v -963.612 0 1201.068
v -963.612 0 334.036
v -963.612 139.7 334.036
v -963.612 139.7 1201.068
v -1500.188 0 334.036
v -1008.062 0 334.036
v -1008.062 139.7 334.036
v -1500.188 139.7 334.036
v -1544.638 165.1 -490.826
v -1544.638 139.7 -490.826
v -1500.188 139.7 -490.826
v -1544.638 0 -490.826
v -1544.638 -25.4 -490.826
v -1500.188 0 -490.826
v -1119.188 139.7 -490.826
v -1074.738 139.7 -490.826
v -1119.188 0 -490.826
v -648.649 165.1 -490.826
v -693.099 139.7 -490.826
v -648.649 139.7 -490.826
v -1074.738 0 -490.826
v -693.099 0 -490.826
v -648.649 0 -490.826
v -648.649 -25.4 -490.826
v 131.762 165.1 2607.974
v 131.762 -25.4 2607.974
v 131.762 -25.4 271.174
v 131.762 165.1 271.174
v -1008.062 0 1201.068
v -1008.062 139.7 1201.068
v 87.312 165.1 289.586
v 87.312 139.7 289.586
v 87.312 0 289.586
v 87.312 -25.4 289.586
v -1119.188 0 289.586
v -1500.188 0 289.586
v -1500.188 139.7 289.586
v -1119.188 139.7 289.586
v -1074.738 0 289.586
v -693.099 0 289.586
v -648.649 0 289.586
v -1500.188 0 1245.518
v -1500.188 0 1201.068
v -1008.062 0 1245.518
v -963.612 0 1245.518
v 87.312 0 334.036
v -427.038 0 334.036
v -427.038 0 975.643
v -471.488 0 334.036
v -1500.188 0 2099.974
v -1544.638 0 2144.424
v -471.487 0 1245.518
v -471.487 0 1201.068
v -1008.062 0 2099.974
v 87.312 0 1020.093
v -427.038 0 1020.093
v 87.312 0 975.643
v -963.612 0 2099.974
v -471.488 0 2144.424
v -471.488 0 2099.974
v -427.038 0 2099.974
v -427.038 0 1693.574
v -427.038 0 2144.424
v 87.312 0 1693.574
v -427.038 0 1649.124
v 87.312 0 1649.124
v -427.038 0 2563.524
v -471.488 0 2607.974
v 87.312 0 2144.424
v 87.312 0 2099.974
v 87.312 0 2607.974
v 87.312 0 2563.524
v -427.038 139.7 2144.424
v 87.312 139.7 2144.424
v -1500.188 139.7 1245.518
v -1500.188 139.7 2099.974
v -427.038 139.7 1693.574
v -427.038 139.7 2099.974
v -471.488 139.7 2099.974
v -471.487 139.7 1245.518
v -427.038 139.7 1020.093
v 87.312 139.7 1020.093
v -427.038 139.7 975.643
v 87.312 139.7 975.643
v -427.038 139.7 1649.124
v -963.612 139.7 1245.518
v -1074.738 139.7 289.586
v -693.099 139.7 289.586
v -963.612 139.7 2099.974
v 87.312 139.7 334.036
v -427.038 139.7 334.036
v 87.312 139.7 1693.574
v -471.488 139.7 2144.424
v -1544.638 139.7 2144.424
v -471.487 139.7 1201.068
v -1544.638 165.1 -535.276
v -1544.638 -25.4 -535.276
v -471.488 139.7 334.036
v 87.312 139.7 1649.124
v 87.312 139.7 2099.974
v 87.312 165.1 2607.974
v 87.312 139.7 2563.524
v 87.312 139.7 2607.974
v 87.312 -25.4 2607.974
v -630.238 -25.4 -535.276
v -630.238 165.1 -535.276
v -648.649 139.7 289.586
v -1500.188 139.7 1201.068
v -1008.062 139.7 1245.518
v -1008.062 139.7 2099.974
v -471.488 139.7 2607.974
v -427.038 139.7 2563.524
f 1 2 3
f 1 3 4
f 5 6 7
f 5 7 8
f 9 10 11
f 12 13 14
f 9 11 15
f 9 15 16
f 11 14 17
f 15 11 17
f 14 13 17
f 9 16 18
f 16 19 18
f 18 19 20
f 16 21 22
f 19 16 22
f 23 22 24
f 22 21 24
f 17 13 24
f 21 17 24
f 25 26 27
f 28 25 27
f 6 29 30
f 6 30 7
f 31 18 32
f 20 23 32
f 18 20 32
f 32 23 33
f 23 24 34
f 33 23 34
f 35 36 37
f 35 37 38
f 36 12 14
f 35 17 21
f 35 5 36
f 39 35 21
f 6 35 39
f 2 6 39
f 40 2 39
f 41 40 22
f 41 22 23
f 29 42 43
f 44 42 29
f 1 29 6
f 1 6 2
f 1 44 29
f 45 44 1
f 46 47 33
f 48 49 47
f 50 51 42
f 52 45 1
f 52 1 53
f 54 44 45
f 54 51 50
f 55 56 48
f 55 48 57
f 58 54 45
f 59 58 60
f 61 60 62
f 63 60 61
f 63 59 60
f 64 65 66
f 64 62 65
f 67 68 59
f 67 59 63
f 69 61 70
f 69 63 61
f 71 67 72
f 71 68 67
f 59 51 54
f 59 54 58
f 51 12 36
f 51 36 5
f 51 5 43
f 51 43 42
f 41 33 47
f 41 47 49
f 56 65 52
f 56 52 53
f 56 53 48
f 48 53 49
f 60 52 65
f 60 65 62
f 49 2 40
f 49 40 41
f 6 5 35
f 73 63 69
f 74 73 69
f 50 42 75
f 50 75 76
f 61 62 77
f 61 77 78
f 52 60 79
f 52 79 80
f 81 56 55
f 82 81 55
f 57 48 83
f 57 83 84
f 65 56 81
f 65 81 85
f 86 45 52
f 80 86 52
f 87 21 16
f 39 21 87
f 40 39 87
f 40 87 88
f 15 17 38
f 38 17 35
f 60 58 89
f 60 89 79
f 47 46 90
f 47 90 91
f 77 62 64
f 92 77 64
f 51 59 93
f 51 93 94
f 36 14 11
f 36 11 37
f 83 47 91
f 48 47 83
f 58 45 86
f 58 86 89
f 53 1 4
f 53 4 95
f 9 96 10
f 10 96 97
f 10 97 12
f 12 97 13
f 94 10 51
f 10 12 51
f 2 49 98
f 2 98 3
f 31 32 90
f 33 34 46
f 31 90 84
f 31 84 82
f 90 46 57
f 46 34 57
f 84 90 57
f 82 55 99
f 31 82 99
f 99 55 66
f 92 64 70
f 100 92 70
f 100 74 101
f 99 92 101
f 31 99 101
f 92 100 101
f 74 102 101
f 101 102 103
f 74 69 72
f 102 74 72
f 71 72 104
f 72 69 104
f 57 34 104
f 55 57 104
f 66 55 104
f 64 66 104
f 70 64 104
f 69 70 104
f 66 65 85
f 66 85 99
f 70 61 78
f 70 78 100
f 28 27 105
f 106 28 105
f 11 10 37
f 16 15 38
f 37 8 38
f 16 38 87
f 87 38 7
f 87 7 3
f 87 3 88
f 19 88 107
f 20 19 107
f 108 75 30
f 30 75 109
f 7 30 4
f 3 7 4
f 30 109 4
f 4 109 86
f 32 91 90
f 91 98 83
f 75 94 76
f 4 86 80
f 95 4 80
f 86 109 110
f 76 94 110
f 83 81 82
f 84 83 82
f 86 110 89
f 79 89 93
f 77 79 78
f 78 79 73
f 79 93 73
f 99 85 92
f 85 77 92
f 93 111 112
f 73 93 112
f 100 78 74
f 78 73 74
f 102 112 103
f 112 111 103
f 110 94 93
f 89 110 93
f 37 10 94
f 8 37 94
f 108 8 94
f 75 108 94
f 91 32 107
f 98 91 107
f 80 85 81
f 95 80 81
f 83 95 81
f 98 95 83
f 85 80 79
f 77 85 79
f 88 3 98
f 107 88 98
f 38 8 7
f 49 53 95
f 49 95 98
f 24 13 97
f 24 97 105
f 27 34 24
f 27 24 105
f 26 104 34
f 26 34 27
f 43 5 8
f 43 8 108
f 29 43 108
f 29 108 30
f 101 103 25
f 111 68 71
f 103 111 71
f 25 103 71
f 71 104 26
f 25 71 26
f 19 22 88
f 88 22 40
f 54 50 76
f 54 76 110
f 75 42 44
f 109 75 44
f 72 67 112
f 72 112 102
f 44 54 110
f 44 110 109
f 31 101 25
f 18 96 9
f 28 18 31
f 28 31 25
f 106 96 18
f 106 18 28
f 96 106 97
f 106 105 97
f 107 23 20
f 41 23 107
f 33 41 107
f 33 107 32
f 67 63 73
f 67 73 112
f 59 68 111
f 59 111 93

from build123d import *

# Parameters (mm, degrees)
F1_DEPTH = 25.4
F2_DEPTH = 165.1
F0_W     = 514.35
F0_H     = 44.45
F0_W_2   = 44.45
F0_H_2   = 780.411792
F0_W_3   = 492.125
F3_DEPTH = 139.7


with BuildPart() as f1:
    # F0 (on Front) → F1 (new body)
    with BuildSketch(Plane.XZ):
        Polygon((-648.649293, -490.826136), (-630.2375, -535.276136), (131.7625, 271.173864), (87.3125, 289.585656), align=None)
        Polygon((87.3125, 289.585656), (131.7625, 271.173864), (131.7625, 2607.973864), (87.3125, 2607.973864), (87.3125, 2563.523864), (87.3125, 2144.423864), (87.3125, 2099.973864), (87.3125, 1693.573864), (87.3125, 1649.123864), (87.3125, 1020.092864), (87.3125, 975.642864), (87.3125, 334.035656), align=None)
        Polygon((-1544.6375, -490.826136), (-1544.6375, -535.276136), (-630.2375, -535.276136), (-648.649293, -490.826136), (-693.099293, -490.826136), (-1074.7375, -490.826136), (-1119.1875, -490.826136), (-1500.1875, -490.826136), align=None)
    extrude(amount=F1_DEPTH)

    # F1_face (on face) → F2 (join)
    with BuildSketch(Plane(origin=(-236.089118, 0, 641.088849), x_dir=(1, 0, 0), z_dir=(0, 1, 0))):
        Polygon((367.851618, 369.914985), (-394.148382, 1176.364985), (-1308.548382, 1176.364985), (-1308.548382, 1131.914985), (-412.560175, 1131.914985), (323.401618, 351.503193), (323.401618, -1966.885015), (367.851618, -1966.885015), align=None)
    extrude(amount=F2_DEPTH)

    # F0 (on Front) → F3 (join)
    with BuildSketch(Plane.XZ):
        Polygon((-471.4875, 2607.973864), (-471.4875, 2144.423864), (-471.4875, 2099.973864), (-471.4875, 1245.517864), (-471.4875, 1201.067864), (-471.4875, 334.035656), (-427.0375, 334.035656), (-427.0375, 975.642864), (-427.0375, 1020.092864), (-427.0375, 1649.123864), (-427.0375, 1693.573864), (-427.0375, 2099.973864), (-427.0375, 2144.423864), (-427.0375, 2563.523864), (-427.0375, 2607.973864), align=None)
        with Locations((-169.8625, 997.867864)):
            Rectangle(F0_W, F0_H)
        with Locations((-169.8625, 1671.348864)):
            Rectangle(F0_W, F0_H)
        Polygon((-1500.1875, 334.035656), (-1500.1875, 289.585656), (-1119.1875, 289.585656), (-1074.7375, 289.585656), (-693.099293, 289.585656), (-648.649293, 289.585656), (87.3125, 289.585656), (87.3125, 334.035656), (-427.0375, 334.035656), (-471.4875, 334.035656), (-963.6125, 334.035656), (-1008.0625, 334.035656), align=None)
        with Locations((-670.874293, -100.62024)):
            Rectangle(F0_W_2, F0_H_2)
        Polygon((-1544.6375, 2099.973864), (-1544.6375, -490.826136), (-1500.1875, -490.826136), (-1500.1875, 289.585656), (-1500.1875, 334.035656), (-1500.1875, 1201.067864), (-1500.1875, 1245.517864), (-1500.1875, 2099.973864), align=None)
        with Locations((-1096.9625, -100.62024)):
            Rectangle(F0_W_2, F0_H_2)
        Polygon((-963.6125, 2099.973864), (-1008.0625, 2099.973864), (-1008.0625, 1245.517864), (-1008.0625, 1201.067864), (-1008.0625, 334.035656), (-963.6125, 334.035656), (-963.6125, 1201.067864), (-963.6125, 1245.517864), align=None)
        with Locations((-1254.125, 1223.292864)):
            Rectangle(F0_W_3, F0_H)
        with Locations((-717.55, 1223.292864)):
            Rectangle(F0_W_3, F0_H)
        with Locations((-169.8625, 2122.198864)):
            Rectangle(F0_W, F0_H)
        Polygon((-1544.6375, 2144.423864), (-1544.6375, 2099.973864), (-1500.1875, 2099.973864), (-1008.0625, 2099.973864), (-963.6125, 2099.973864), (-471.4875, 2099.973864), (-471.4875, 2144.423864), align=None)
        with Locations((-169.8625, 2585.748864)):
            Rectangle(F0_W, F0_H)
    extrude(amount=-F3_DEPTH)


solid = f1.part
